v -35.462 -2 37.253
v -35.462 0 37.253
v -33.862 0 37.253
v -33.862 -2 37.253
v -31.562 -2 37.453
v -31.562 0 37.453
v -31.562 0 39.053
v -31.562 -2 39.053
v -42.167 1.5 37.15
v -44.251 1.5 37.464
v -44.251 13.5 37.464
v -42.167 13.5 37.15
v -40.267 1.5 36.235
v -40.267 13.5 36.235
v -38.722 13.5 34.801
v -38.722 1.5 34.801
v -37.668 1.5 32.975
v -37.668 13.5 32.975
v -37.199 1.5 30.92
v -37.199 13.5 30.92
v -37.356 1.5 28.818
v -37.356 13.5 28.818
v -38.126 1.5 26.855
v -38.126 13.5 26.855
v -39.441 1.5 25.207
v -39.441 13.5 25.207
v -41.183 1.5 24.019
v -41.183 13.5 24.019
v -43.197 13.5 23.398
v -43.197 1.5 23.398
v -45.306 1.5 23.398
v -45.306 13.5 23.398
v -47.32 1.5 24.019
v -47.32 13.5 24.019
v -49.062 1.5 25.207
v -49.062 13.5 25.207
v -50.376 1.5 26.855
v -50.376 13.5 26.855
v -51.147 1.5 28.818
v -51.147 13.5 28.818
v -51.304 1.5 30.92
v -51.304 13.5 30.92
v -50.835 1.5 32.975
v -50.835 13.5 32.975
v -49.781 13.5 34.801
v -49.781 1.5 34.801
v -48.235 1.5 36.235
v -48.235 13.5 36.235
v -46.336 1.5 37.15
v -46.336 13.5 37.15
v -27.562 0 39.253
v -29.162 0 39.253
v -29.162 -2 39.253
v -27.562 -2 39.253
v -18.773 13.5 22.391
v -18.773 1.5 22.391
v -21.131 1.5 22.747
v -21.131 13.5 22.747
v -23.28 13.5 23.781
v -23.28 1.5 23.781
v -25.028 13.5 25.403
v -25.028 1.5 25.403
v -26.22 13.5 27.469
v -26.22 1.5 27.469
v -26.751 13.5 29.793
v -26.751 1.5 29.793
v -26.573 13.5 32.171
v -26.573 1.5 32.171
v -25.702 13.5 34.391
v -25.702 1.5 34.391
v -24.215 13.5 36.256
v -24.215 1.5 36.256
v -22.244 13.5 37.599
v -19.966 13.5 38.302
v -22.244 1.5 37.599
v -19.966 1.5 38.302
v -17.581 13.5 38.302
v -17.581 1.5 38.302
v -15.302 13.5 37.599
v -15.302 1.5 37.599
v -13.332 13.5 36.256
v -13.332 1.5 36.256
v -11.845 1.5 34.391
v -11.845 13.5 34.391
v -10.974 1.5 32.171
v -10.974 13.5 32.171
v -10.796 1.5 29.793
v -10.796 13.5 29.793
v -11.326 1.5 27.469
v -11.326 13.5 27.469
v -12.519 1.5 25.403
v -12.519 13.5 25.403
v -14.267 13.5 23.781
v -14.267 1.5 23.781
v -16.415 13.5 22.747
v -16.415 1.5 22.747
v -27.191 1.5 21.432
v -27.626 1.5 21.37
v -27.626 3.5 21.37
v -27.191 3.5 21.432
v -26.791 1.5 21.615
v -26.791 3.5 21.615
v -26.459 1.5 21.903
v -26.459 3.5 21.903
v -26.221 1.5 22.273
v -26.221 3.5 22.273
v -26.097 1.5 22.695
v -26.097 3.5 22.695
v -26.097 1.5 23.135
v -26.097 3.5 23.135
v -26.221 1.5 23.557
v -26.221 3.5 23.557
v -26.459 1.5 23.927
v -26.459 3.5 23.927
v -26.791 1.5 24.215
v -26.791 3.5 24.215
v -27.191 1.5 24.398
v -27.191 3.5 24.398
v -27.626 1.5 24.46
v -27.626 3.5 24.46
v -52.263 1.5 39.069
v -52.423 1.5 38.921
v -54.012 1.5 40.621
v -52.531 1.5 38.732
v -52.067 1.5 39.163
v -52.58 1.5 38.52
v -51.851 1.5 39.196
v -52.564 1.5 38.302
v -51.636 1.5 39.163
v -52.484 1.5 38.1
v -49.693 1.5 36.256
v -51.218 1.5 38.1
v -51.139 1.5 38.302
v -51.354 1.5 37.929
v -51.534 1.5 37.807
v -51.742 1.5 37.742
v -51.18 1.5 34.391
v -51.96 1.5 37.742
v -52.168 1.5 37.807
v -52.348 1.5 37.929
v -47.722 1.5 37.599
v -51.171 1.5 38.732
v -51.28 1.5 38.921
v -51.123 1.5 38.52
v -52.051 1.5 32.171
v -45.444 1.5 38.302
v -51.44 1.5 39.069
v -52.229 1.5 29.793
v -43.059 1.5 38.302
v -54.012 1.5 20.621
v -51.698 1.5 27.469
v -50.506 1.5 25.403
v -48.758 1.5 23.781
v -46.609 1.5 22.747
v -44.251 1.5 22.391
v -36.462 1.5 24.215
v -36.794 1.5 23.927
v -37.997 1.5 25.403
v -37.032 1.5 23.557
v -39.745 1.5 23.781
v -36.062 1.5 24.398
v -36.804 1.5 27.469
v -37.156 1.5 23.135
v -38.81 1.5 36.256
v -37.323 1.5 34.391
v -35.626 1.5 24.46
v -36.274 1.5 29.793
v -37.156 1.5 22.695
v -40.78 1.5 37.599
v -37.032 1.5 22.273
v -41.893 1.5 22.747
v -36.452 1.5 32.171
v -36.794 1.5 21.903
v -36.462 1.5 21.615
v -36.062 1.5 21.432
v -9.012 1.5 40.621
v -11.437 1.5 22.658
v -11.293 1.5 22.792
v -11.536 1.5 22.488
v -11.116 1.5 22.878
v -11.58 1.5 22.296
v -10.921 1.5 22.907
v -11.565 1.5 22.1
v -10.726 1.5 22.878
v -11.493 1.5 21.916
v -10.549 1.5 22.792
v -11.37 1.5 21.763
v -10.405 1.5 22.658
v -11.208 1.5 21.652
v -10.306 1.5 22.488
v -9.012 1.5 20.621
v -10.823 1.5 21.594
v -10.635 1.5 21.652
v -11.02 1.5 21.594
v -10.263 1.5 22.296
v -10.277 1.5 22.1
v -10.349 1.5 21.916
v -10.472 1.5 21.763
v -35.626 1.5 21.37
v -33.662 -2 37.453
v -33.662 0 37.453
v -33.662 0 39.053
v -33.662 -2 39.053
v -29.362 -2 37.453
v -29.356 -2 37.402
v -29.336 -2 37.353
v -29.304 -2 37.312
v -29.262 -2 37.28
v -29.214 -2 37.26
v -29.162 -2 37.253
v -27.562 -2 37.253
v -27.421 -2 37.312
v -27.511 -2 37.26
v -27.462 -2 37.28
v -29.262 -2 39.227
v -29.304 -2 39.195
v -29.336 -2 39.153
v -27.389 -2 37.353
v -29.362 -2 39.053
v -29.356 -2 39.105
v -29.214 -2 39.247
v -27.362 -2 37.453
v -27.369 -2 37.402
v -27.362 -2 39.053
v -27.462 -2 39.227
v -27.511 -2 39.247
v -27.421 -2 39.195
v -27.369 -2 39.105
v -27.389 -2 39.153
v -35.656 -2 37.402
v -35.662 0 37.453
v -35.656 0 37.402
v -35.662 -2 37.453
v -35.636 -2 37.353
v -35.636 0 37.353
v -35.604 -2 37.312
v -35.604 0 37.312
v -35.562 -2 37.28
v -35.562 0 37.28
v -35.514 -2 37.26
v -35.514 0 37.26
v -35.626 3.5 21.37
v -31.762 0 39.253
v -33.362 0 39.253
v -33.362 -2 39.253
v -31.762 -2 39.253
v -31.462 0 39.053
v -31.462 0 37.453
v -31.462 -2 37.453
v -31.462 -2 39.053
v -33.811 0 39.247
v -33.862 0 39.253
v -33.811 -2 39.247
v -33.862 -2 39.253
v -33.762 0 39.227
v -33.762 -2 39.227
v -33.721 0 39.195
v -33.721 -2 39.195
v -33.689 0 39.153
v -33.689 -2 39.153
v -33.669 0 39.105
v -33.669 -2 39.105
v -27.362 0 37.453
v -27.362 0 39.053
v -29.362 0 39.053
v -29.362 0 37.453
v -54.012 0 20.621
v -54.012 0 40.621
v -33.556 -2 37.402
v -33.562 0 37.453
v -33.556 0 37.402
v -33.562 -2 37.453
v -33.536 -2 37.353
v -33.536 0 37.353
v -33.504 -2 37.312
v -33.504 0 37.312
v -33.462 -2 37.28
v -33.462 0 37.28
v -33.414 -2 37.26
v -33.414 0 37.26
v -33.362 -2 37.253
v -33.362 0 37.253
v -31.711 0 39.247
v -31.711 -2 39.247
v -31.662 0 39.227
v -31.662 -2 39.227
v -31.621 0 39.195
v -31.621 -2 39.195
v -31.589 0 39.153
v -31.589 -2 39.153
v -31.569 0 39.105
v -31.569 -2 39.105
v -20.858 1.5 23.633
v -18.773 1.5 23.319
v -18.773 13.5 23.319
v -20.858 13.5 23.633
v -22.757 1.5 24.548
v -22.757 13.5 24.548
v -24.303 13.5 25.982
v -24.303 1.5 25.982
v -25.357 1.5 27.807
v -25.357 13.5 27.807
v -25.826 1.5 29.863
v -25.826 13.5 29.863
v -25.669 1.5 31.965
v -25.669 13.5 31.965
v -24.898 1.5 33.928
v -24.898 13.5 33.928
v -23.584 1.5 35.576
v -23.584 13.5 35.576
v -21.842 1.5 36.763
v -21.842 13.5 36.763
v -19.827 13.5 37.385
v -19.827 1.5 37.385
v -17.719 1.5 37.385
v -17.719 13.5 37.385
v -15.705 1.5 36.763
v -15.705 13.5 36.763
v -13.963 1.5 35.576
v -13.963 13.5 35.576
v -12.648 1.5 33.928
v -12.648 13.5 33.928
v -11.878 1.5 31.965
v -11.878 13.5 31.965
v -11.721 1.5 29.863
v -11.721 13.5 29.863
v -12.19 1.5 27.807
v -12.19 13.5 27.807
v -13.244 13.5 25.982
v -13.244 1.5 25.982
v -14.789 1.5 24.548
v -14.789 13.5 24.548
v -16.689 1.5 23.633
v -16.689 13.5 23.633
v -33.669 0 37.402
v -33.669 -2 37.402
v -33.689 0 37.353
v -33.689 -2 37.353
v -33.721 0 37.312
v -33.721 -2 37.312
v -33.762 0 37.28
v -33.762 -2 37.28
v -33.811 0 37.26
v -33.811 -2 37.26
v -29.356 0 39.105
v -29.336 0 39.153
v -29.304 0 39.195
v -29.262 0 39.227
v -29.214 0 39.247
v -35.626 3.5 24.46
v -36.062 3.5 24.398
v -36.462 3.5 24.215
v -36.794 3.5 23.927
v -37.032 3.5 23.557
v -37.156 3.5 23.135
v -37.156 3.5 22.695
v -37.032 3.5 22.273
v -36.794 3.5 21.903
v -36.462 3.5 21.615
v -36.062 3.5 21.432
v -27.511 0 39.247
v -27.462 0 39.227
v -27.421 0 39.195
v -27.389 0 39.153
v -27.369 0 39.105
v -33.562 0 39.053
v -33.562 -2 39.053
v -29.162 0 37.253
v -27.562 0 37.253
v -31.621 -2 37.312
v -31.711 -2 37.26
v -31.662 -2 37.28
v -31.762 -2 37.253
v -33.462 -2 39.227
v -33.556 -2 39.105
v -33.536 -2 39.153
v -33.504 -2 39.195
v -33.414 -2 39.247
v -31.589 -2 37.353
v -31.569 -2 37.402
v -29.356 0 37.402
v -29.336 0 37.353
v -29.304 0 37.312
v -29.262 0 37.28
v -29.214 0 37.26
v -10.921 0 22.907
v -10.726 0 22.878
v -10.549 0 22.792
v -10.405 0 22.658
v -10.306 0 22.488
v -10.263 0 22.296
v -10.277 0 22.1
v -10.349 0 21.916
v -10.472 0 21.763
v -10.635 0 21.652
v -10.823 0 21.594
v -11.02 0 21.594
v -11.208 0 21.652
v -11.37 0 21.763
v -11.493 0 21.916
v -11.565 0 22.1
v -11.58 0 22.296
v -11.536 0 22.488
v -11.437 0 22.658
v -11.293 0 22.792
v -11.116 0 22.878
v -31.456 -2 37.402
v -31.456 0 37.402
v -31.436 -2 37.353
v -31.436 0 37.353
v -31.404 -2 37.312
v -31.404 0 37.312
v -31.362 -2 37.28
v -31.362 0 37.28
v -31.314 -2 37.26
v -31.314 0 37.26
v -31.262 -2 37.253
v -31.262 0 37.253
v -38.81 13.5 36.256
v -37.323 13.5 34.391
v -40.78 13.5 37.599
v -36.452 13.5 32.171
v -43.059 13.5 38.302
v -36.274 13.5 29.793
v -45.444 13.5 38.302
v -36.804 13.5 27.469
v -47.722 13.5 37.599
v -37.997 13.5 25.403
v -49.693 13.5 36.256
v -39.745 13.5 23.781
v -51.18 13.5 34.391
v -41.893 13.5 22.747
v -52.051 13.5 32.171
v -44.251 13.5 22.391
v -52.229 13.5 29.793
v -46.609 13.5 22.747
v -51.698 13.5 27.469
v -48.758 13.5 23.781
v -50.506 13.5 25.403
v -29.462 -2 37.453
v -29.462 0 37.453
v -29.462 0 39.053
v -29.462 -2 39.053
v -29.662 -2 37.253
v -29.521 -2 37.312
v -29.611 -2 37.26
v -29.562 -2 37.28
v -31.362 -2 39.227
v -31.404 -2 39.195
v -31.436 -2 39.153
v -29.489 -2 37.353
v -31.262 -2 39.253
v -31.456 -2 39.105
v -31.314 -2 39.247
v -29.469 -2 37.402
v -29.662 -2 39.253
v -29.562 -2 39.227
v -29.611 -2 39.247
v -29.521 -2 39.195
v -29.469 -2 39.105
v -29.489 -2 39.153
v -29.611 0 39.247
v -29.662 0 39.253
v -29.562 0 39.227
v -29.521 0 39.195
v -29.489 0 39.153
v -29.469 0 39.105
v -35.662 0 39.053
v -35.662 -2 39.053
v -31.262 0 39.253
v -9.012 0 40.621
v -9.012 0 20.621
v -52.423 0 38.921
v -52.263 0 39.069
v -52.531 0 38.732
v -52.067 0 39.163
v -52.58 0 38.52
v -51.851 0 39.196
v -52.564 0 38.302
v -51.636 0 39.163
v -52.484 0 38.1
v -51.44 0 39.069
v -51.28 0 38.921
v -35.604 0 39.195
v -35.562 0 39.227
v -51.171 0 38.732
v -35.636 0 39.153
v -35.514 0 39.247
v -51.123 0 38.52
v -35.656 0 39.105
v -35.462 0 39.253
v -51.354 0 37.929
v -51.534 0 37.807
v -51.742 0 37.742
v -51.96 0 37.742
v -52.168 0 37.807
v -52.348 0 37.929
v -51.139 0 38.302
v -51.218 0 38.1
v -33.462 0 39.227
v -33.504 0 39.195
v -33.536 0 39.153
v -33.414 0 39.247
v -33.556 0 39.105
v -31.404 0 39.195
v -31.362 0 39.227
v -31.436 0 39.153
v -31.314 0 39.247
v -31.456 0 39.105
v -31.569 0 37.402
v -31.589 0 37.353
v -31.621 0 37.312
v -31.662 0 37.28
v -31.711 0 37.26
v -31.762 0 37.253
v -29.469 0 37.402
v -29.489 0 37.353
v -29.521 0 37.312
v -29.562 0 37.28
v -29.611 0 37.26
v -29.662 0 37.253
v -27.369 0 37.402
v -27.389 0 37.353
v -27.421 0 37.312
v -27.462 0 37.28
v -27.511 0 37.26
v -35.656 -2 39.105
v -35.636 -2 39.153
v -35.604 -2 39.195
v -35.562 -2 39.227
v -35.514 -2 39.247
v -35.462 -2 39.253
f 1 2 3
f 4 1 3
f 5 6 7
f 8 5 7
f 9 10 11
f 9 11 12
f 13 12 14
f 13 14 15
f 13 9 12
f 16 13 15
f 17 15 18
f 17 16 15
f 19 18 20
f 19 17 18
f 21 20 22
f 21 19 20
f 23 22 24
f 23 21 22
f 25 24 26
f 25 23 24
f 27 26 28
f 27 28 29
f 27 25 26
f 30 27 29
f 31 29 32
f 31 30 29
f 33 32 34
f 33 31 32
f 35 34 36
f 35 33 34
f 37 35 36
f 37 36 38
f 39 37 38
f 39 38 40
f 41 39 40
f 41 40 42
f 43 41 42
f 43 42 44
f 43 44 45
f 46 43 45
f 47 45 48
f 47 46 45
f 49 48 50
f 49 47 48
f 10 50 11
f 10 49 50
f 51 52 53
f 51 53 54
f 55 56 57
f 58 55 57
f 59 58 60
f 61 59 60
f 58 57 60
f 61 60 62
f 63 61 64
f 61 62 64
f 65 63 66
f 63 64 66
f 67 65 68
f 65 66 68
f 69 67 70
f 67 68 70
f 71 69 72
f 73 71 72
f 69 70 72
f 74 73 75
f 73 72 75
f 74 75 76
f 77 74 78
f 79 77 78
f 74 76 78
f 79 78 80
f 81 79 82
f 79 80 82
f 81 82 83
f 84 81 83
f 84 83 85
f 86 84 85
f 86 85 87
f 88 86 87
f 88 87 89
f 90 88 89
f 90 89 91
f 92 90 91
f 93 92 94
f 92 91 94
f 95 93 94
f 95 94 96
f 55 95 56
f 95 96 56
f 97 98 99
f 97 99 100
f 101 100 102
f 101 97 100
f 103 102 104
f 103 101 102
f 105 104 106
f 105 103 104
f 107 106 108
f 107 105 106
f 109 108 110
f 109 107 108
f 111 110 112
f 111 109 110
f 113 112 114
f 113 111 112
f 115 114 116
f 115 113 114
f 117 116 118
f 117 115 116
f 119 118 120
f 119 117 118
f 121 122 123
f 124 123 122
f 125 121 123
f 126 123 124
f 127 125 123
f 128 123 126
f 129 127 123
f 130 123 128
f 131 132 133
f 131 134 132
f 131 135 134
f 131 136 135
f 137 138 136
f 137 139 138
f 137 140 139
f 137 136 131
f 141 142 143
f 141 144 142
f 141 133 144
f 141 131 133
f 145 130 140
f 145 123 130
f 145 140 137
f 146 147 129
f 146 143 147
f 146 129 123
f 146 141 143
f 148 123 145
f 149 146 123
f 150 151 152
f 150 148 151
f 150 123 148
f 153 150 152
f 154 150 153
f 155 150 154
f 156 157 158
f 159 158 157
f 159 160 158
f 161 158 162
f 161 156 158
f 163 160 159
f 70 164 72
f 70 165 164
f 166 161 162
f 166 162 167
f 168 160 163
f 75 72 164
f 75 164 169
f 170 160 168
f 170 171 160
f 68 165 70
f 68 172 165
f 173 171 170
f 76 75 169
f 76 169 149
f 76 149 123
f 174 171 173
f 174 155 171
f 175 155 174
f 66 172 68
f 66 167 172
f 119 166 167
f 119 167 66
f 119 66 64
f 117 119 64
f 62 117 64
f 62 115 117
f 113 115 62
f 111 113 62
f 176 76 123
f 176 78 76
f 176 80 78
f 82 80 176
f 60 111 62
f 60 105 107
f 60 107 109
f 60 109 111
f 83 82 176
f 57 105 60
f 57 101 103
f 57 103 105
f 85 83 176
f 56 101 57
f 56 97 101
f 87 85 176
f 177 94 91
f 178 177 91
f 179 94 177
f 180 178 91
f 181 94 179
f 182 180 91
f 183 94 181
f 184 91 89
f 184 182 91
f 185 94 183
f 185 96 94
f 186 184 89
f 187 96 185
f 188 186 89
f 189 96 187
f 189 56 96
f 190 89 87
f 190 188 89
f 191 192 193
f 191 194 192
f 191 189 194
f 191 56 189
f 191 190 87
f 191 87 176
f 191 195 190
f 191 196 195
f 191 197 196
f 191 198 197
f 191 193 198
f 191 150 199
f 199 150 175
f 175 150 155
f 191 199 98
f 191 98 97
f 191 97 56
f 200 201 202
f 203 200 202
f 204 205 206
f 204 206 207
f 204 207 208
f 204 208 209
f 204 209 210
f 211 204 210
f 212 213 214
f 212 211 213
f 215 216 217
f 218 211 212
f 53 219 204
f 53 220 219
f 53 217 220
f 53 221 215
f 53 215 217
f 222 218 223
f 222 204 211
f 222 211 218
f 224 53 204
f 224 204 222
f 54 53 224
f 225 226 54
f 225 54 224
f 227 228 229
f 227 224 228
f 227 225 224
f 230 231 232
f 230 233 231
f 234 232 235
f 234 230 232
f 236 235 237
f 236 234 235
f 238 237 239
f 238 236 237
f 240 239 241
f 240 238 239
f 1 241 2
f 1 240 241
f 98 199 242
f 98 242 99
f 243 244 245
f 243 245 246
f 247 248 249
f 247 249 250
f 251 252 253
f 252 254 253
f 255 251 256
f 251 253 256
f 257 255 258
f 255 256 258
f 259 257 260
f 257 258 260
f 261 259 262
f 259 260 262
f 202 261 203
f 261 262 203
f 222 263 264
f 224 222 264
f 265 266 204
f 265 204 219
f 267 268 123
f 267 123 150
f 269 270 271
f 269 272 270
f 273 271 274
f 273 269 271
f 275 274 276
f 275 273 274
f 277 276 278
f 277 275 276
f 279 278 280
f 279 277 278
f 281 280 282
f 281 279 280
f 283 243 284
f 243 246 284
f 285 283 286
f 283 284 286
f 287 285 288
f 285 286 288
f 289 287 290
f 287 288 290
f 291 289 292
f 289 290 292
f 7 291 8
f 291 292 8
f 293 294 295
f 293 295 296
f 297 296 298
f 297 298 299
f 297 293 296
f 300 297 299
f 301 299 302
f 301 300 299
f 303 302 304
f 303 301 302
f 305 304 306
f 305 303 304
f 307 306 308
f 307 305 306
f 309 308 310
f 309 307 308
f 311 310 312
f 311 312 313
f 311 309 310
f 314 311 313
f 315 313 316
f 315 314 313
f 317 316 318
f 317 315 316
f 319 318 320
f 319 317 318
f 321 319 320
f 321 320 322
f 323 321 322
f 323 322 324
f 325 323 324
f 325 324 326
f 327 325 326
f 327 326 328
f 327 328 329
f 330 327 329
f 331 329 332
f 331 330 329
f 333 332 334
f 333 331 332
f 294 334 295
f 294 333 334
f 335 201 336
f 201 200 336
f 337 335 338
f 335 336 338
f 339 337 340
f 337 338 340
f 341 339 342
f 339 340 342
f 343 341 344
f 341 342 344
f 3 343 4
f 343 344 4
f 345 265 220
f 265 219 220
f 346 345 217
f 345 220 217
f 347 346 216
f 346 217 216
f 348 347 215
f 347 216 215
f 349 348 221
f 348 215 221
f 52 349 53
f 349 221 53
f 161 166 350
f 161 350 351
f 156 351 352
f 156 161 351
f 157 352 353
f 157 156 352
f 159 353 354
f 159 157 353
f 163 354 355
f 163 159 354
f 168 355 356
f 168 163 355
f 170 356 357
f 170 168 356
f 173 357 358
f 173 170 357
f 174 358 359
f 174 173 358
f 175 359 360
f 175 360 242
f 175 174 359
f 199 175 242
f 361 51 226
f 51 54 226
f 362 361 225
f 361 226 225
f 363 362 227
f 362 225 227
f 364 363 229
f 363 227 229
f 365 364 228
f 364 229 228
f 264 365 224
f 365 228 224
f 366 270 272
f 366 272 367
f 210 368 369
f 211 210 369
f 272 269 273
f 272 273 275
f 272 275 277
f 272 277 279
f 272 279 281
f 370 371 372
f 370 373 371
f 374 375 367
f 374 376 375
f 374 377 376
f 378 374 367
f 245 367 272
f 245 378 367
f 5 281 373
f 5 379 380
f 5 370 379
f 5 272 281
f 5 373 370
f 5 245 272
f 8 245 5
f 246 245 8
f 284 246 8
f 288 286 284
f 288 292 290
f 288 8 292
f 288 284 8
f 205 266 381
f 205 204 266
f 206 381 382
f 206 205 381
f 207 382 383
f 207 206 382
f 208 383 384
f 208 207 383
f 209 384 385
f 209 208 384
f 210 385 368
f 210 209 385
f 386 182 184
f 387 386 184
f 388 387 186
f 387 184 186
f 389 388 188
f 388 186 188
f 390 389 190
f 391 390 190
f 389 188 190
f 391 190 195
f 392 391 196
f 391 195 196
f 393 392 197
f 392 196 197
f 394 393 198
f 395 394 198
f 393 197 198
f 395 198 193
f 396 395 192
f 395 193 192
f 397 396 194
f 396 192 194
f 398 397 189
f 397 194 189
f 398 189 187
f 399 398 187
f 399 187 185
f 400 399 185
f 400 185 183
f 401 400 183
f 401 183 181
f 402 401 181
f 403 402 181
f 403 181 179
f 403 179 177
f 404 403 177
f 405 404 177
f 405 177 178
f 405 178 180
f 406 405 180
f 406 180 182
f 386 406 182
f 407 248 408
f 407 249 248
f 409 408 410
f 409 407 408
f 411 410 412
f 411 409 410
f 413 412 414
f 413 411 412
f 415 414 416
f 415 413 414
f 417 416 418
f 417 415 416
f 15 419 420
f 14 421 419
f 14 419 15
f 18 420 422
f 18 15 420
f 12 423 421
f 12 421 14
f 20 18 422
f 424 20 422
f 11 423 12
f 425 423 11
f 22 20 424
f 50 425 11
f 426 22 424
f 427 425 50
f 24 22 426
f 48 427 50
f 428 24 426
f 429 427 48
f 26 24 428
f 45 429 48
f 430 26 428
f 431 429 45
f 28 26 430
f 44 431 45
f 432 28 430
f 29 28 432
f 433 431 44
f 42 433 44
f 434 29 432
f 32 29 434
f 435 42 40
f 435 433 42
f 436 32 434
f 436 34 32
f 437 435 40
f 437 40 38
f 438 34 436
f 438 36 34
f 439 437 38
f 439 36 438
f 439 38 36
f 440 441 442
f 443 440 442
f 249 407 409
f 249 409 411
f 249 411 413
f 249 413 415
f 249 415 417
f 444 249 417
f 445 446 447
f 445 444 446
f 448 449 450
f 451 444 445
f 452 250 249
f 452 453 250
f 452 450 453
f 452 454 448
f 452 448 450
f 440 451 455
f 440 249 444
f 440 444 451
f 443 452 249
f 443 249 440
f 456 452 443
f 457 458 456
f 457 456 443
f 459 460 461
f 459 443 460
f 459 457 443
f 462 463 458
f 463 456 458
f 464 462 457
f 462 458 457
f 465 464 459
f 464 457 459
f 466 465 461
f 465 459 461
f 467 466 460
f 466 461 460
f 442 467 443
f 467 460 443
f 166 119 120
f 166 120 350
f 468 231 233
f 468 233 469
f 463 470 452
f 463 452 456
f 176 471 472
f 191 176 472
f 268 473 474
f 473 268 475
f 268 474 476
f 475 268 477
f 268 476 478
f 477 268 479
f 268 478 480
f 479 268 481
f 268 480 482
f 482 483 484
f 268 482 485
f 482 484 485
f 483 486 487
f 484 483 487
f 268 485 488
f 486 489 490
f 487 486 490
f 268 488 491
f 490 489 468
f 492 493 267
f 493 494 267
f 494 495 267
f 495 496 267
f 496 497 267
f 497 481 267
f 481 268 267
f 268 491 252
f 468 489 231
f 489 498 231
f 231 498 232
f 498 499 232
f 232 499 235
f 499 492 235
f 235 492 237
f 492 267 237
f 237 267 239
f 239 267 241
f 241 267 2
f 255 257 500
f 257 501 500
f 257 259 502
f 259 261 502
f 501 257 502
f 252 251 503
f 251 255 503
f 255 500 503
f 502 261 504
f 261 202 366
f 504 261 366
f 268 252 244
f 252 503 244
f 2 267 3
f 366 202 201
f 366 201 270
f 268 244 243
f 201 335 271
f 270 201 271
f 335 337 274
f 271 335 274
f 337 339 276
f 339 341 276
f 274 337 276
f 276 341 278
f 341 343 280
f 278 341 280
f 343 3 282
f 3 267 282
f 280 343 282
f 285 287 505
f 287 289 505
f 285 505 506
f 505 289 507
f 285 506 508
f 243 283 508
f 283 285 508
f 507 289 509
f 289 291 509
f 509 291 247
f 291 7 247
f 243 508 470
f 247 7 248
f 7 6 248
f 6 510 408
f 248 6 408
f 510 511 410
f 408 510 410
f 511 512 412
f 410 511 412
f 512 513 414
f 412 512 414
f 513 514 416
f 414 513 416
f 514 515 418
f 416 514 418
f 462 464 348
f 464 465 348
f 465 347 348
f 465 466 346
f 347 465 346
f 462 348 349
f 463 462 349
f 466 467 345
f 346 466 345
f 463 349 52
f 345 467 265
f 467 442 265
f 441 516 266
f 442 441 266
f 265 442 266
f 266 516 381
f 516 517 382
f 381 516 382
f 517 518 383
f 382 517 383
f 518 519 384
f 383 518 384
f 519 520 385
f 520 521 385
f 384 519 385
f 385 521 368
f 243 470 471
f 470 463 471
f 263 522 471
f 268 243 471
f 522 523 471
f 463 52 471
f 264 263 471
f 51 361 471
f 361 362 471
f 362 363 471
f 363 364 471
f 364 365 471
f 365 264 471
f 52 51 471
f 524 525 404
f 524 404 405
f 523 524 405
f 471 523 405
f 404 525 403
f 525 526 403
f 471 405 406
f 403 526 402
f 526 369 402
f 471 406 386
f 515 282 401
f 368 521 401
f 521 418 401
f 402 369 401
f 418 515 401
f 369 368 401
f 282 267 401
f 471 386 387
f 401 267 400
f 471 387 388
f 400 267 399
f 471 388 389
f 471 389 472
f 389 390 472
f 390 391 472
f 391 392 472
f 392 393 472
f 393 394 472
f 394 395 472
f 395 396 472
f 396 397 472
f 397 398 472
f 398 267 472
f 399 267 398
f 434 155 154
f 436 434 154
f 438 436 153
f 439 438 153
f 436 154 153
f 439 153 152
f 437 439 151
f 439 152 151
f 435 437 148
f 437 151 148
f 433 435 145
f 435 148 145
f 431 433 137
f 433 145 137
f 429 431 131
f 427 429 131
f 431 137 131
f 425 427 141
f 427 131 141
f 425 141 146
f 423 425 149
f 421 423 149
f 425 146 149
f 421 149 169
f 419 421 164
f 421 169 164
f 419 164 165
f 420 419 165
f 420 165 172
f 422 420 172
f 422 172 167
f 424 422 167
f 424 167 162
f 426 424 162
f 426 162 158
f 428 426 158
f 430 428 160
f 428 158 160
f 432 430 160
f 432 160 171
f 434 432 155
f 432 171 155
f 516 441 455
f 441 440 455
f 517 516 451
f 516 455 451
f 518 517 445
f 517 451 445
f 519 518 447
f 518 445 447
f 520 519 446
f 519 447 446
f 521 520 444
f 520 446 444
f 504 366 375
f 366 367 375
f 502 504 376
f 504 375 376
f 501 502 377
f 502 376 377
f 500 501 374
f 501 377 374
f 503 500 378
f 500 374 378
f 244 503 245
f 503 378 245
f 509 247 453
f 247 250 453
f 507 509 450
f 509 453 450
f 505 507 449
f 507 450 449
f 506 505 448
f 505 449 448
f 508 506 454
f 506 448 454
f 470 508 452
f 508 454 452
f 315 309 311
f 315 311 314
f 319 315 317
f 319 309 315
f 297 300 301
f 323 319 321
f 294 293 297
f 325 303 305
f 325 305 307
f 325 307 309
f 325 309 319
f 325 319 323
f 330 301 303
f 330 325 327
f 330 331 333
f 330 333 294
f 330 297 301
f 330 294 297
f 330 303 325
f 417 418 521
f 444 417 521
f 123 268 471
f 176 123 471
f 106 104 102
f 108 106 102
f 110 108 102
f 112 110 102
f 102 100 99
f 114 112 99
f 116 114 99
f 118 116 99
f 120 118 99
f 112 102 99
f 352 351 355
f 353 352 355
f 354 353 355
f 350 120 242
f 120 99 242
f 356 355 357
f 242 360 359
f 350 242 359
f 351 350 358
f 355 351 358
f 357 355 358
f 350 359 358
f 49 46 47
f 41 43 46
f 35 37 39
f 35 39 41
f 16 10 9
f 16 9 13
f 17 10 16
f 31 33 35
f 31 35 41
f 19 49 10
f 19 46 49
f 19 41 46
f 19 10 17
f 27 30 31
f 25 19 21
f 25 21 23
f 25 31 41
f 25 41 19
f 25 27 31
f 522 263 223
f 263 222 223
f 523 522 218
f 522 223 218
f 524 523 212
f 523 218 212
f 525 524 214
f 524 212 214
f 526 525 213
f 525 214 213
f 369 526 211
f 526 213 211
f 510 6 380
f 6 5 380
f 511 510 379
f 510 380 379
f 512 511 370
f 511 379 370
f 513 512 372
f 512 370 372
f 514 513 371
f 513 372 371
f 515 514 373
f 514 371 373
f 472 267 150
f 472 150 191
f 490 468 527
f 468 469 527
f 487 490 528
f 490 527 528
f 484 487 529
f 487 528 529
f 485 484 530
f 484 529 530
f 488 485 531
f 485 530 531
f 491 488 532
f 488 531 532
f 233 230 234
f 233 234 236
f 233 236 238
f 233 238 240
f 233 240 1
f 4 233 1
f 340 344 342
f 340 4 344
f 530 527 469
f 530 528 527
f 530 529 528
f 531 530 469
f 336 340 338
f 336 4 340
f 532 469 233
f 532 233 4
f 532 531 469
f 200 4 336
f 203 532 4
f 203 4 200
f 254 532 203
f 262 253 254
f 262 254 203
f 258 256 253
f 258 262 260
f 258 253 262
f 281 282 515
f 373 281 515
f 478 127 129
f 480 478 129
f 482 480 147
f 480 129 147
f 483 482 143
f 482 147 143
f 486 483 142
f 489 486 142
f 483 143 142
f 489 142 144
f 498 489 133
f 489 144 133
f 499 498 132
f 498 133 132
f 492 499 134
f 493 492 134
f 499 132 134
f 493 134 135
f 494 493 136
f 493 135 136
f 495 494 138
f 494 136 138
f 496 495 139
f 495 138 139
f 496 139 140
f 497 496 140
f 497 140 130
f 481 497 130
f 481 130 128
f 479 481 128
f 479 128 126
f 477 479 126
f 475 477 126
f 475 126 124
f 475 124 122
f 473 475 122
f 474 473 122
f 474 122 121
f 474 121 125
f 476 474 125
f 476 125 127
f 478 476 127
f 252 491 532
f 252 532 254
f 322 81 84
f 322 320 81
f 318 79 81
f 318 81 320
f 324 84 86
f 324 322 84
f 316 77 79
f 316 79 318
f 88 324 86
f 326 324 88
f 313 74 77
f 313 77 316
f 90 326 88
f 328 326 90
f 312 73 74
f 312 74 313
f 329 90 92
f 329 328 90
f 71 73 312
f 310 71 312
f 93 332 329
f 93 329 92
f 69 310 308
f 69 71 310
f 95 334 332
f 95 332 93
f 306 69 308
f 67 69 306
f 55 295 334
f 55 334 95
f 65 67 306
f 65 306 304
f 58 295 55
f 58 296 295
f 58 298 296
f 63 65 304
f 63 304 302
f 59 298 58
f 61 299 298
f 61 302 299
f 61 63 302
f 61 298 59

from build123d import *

# Parameters (mm, degrees)
SKETCH1_W              = 45
SKETCH1_H              = 20
BOSS_EXTRUDE2_DEPTH    = 1.5
SKETCH2_R              = 8
SKETCH2_R_2            = 7.072496476
BOSS_EXTRUDE3_DEPTH    = 12
BOSS_EXTRUDE4_DEPTH    = 2
SKETCH4_R              = 0.730672048
CUT_EXTRUDE6_DEPTH     = 22
SKETCH7_R              = 0.66039865
CUT_EXTRUDE9_DEPTH     = 11
SKETCH9_W              = 2
SKETCH9_H              = 2
BOSS_EXTRUDE5_DEPTH    = 2
FILLET2_R              = 0.2
LPATTERN1_COUNT        = 4
LPATTERN1_PITCH        = 2.1
FILLET2_OF_LPATTERN1_R = 0.2


with BuildPart() as part:
    # Sketch1 → Boss-Extrude2 (new body)
    with BuildSketch(Plane(origin=(0, 0, 0), x_dir=(1, 0, 0), z_dir=(0, 1, 0))):
        with Locations((-31.512400592, -30.621028873)):
            Rectangle(SKETCH1_W, SKETCH1_H)
    extrude(amount=BOSS_EXTRUDE2_DEPTH)

    # Sketch2 → Boss-Extrude3 (add)
    # profile 1 of 2: a face of its own
    with BuildSketch(Plane(origin=(0, 1.5, 0), x_dir=(1, 0, 0), z_dir=(0, 1, 0))):
        with Locations(Location((-44.251420367, -30.391308844, 0), (0, 0, 90))):
            Circle(SKETCH2_R)
        with Locations(Location((-44.251420367, -30.391308844, 0), (0, 0, 270))):
            Circle(SKETCH2_R_2, mode=Mode.SUBTRACT)
    # profile 2 of 2: a face of its own
    with BuildSketch(Plane(origin=(0, 1.5, 0), x_dir=(1, 0, 0), z_dir=(0, 1, 0))):
        with Locations(Location((-18.773380818, -30.391308844, 0), (0, 0, 90))):
            Circle(SKETCH2_R)
        with Locations(Location((-18.773380818, -30.391308844, 0), (0, 0, 90))):
            Circle(SKETCH2_R_2, mode=Mode.SUBTRACT)
    extrude(amount=BOSS_EXTRUDE3_DEPTH)

    # Sketch3 → Boss-Extrude4 (add)
    with BuildSketch(Plane(origin=(0, 1.5, 0), x_dir=(1, 0, 0), z_dir=(0, 1, 0))):
        with BuildLine():
            Line((-35.62647747, -21.369576807), (-27.62647747, -21.369576807))
            ThreePointArc((-27.62647747, -21.369576807), (-26.081088186, -22.914966091), (-27.62647747, -24.460355375))
            Line((-27.62647747, -24.460355375), (-35.62647747, -24.460355375))
            ThreePointArc((-35.62647747, -24.460355375), (-37.171866754, -22.914966091), (-35.62647747, -21.369576807))
        make_face()
    extrude(amount=BOSS_EXTRUDE4_DEPTH)

    # Sketch4 → Cut-Extrude6 (cut)
    with BuildSketch(Plane(origin=(0, 1.5, 0), x_dir=(1, 0, 0), z_dir=(0, 1, 0))):
        with Locations(Location((-51.851239407, -38.465008216, 0), (0, 0, 270))):
            Circle(SKETCH4_R)
    extrude(amount=-CUT_EXTRUDE6_DEPTH, mode=Mode.SUBTRACT)

    # Sketch7 → Cut-Extrude9 (cut)
    with BuildSketch(Plane(origin=(0, 1.5, 0), x_dir=(1, 0, 0), z_dir=(0, 1, 0))):
        with Locations(Location((-10.921132564, -22.246689644, 0), (0, 0, 270))):
            Circle(SKETCH7_R)
    extrude(amount=-CUT_EXTRUDE9_DEPTH, mode=Mode.SUBTRACT)

    # Sketch9 → Boss-Extrude5 (add)
    with BuildSketch(Plane.XZ):
        with Locations((-28.362400592, 38.253484629)):
            Rectangle(SKETCH9_W, SKETCH9_H)
    boss_extrude5 = extrude(amount=BOSS_EXTRUDE5_DEPTH)

    # Fillet2
    fillet2_edges = [part.edges().sort_by_distance(p)[0] for p in [
        (-27.362400592, -1, 37.253484629),
        (-27.362400592, -1, 39.253484629),
        (-29.362400592, -1, 39.253484629),
        (-29.362400592, -1, 37.253484629),
    ]]
    fillet(fillet2_edges, radius=FILLET2_R)

    # LPattern1: Boss-Extrude5 ×4
    with Locations(*[(-i * LPATTERN1_PITCH, 0, 0) for i in range(1, LPATTERN1_COUNT)]):
        add(boss_extrude5)

    # Fillet2 of LPattern1
    fillet2_of_lpattern1_edges = [part.edges().sort_by_distance(p)[0] for p in [
        (-29.462400592, -1, 37.253484629),
        (-29.462400592, -1, 39.253484629),
        (-31.462400592, -1, 39.253484629),
        (-31.462400592, -1, 37.253484629),
        (-31.562400592, -1, 37.253484629),
        (-31.562400592, -1, 39.253484629),
        (-33.562400592, -1, 39.253484629),
        (-33.562400592, -1, 37.253484629),
        (-33.662400592, -1, 37.253484629),
        (-33.662400592, -1, 39.253484629),
        (-35.662400592, -1, 39.253484629),
        (-35.662400592, -1, 37.253484629),
    ]]
    fillet(fillet2_of_lpattern1_edges, radius=FILLET2_OF_LPATTERN1_R)


solid = part.part
